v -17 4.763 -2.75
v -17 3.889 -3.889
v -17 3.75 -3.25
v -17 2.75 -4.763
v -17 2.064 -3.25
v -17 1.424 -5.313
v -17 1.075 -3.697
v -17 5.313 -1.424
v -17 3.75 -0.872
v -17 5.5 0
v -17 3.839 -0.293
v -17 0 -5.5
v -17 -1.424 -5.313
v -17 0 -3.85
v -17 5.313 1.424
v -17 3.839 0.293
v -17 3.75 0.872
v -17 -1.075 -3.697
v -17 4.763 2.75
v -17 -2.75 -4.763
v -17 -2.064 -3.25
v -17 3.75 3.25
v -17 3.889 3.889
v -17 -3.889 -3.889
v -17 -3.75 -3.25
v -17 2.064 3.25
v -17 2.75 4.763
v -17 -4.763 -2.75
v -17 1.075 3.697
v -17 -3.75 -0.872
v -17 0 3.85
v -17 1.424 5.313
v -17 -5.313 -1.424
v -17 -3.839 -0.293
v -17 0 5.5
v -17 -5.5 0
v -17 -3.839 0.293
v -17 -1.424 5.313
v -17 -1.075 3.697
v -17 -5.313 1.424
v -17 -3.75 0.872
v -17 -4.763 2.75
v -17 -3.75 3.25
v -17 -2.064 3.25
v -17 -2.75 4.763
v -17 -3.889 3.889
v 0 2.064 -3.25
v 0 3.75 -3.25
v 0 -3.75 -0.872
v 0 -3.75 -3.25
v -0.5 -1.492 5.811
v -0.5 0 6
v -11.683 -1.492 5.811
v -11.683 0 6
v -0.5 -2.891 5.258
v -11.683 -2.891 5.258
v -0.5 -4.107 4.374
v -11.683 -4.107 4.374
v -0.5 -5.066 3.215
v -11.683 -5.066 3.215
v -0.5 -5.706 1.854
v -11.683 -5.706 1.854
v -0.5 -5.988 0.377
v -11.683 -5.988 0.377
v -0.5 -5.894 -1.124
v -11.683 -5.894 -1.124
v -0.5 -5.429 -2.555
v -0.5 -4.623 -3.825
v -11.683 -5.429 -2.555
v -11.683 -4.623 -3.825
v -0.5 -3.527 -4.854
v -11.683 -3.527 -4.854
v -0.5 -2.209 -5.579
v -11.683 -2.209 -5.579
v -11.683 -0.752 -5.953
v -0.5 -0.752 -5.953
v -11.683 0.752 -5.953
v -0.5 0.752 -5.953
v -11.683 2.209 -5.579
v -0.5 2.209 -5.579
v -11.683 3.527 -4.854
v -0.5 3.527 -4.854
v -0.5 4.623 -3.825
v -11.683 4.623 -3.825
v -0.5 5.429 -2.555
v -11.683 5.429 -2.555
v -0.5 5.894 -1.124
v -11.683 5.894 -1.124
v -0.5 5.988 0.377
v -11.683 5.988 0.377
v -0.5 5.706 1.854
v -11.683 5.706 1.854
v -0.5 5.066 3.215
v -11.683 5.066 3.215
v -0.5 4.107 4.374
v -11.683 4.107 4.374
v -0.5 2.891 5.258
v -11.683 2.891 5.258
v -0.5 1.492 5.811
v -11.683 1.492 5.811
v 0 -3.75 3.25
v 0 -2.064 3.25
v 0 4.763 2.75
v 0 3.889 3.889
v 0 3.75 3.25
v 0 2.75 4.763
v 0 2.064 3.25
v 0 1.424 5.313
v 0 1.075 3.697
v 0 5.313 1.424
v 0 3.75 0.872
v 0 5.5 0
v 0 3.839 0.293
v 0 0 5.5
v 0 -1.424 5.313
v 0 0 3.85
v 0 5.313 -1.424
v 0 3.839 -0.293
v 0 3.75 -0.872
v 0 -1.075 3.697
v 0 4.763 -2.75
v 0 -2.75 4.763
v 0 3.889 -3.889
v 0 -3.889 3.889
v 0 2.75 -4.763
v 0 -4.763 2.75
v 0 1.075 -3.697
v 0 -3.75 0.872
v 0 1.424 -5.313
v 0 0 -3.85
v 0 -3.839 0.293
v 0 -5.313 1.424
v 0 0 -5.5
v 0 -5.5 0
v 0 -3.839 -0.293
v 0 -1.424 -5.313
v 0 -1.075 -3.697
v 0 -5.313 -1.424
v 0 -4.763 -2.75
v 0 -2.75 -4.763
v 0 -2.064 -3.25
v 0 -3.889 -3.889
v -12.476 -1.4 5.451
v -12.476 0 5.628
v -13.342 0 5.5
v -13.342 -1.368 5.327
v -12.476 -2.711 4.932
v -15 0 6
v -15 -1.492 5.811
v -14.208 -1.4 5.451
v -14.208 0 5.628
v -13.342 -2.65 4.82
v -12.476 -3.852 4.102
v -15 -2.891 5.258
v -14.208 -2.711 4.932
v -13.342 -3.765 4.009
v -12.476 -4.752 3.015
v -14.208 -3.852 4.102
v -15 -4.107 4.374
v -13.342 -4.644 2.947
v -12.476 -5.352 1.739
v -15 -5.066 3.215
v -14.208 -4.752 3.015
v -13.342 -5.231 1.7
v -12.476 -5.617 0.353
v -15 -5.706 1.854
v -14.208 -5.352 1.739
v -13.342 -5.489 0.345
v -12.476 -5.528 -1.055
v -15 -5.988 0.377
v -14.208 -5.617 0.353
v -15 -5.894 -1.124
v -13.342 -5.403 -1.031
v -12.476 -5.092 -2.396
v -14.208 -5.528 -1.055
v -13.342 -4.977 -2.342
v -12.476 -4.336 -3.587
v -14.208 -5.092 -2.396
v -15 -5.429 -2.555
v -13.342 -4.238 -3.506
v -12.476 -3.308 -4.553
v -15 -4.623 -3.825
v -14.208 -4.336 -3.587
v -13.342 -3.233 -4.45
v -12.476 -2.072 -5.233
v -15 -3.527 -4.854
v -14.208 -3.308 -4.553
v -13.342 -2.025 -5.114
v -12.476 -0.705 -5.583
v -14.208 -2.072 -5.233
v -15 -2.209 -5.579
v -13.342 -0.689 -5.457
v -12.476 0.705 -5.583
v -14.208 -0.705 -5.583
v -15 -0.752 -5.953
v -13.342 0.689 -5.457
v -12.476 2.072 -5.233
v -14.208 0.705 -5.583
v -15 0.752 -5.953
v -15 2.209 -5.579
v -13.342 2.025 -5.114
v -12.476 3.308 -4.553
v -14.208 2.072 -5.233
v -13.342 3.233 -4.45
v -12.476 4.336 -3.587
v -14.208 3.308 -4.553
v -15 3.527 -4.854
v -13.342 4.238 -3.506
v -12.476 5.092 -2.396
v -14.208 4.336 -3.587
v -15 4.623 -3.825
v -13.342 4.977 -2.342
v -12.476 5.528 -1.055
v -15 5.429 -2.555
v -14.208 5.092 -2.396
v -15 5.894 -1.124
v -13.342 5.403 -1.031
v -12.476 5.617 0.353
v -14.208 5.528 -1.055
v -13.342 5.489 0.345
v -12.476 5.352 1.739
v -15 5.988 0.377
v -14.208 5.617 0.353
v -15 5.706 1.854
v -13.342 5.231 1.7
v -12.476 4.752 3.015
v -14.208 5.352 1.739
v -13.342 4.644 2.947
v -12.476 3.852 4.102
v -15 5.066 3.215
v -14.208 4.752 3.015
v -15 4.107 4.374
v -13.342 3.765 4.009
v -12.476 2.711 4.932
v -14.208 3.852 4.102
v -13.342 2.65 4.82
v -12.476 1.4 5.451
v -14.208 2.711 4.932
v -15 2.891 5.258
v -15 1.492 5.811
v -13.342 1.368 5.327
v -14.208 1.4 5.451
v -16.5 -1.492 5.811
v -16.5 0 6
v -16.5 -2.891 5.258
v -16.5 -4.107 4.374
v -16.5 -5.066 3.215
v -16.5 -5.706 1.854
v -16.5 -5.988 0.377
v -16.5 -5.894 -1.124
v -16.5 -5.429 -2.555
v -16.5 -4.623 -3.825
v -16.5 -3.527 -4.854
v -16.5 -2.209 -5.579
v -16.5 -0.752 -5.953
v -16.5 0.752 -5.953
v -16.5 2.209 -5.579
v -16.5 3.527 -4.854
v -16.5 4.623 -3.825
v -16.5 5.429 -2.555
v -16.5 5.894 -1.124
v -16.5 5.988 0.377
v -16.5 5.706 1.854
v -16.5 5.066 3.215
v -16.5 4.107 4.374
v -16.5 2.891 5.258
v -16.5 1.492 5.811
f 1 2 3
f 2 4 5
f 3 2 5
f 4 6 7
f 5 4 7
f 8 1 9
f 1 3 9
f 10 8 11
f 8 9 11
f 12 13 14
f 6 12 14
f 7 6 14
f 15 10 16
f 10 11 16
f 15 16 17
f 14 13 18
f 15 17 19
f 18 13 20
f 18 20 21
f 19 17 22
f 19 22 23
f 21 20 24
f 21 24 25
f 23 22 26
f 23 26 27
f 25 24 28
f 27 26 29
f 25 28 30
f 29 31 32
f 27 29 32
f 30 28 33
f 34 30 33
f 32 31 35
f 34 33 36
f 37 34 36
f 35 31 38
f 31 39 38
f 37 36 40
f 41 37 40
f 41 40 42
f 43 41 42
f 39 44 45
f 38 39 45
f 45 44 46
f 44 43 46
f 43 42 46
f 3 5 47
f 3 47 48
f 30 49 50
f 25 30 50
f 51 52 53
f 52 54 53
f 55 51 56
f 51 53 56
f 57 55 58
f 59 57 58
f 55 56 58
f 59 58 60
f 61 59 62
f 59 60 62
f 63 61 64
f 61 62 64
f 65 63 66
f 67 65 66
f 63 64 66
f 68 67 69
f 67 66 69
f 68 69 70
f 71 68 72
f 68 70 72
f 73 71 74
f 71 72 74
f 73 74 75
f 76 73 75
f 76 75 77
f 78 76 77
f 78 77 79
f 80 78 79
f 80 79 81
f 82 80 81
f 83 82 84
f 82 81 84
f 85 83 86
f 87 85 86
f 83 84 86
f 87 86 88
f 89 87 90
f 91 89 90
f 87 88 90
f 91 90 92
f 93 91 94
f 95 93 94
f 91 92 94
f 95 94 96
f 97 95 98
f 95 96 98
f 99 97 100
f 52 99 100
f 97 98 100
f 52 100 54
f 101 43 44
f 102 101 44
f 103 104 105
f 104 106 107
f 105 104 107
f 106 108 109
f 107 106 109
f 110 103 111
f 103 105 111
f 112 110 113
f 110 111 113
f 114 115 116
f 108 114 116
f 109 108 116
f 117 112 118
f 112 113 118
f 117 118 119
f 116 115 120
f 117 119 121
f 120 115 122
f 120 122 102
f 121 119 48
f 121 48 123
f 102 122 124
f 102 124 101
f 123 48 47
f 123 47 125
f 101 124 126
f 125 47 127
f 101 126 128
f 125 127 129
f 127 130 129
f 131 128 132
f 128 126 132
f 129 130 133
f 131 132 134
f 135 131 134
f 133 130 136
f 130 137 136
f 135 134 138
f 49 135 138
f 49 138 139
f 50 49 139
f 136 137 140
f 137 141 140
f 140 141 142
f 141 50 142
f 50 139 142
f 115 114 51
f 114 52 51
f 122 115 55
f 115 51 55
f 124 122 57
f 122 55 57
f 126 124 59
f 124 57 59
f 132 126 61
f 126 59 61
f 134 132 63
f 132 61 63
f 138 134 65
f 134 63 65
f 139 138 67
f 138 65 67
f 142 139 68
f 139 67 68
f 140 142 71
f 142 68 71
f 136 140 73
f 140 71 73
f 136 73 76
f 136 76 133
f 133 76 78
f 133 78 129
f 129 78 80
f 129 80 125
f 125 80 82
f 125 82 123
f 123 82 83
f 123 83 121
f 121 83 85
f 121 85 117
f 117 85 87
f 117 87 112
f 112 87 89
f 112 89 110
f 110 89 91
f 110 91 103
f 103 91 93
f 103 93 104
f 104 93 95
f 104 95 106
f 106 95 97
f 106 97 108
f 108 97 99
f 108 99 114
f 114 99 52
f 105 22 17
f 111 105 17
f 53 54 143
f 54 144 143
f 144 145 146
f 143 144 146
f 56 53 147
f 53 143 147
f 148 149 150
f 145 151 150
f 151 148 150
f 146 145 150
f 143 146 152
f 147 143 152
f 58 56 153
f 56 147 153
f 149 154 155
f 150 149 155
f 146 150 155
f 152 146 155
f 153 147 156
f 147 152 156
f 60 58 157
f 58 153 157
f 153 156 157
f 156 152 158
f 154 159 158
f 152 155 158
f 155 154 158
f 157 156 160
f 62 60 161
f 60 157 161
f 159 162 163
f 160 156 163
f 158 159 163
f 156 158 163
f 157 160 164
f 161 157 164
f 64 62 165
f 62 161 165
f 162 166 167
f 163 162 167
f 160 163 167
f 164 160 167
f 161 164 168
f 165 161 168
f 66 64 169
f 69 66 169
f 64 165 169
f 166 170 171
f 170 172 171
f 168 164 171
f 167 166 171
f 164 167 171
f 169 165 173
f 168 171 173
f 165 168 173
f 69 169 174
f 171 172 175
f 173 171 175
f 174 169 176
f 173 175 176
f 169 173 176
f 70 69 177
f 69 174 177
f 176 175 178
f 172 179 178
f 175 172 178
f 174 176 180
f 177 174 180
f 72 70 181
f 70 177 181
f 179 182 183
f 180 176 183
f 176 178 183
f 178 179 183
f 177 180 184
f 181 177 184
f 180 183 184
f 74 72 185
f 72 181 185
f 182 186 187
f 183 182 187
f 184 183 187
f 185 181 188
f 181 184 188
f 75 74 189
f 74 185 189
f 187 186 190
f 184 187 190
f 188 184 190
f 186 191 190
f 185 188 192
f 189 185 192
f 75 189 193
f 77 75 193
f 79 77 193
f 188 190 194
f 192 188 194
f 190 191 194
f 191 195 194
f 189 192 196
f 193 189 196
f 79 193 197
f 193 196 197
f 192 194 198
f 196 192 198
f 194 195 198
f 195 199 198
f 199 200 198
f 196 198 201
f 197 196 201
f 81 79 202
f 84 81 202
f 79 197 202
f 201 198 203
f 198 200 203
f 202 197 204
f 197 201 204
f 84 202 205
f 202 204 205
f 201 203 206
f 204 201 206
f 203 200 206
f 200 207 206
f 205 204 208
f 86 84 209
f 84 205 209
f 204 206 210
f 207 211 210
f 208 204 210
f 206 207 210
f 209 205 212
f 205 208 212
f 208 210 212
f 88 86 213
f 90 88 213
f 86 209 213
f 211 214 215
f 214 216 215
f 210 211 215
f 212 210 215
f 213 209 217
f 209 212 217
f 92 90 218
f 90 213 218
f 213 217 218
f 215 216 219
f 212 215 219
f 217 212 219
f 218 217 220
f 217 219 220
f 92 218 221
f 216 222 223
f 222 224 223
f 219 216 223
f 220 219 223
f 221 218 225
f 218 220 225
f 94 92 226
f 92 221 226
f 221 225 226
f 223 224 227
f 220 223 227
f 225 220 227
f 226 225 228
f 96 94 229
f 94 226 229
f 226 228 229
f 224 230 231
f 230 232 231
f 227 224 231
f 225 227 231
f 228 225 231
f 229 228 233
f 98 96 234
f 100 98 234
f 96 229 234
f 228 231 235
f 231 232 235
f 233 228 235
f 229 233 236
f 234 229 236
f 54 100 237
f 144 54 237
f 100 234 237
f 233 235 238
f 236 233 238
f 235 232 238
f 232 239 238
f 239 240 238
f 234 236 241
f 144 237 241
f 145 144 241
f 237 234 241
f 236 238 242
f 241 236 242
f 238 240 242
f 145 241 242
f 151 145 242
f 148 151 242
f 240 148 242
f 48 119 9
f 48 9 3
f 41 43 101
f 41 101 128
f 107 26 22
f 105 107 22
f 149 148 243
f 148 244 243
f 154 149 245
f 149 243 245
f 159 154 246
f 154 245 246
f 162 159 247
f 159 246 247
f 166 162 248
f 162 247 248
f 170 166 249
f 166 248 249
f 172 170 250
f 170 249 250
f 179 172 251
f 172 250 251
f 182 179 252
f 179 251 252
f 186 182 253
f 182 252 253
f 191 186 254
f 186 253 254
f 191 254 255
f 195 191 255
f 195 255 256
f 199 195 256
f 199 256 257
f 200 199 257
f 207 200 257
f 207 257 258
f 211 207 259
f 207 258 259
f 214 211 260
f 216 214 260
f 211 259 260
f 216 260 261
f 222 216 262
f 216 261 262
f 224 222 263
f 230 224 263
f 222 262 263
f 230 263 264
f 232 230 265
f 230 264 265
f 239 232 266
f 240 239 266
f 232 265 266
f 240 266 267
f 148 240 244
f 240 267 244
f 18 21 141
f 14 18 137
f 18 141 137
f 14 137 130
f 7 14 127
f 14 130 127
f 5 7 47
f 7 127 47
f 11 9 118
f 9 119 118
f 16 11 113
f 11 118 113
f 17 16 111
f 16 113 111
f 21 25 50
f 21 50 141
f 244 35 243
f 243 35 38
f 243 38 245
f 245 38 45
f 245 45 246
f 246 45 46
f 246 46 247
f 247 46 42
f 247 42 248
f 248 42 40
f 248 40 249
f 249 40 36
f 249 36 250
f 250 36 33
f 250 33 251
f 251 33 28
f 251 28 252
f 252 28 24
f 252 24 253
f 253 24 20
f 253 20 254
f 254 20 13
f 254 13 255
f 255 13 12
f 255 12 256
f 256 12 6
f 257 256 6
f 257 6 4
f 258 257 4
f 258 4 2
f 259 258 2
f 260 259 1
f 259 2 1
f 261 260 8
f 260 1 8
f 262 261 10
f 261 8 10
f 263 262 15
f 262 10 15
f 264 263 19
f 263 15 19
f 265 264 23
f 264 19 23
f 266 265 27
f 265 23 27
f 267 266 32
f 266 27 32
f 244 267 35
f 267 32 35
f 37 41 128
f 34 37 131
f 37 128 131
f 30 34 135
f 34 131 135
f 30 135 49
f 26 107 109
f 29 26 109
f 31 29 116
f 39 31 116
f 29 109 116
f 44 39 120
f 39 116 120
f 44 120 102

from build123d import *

# Parameters (mm, degrees)
ESQUISSE2_W             = 6.5
ESQUISSE2_H             = 7.5
ENL_V_MAT_EXTRU_1_DEPTH = 20


with BuildPart() as part:
    # Esquisse1 → Révolution1 (revolve)
    with BuildSketch(Plane.XY):
        with BuildLine():
            Line((-17, 5.5), (-17, 3.85))
            Line((-17, 3.85), (0, 3.85))
            Line((0, 3.85), (0, 5.5))
            Line((0, 5.5), (-0.5, 6))
            Line((-0.5, 6), (-11.68337521, 6))
            ThreePointArc((-11.68337521, 6), (-13.341687605, 5.5), (-15, 6))
            Line((-15, 6), (-16.5, 6))
            Line((-16.5, 6), (-17, 5.5))
        make_face()
    revolve(axis=Axis((-34.750549451, 0, 0), (1, 0, 0)))

    # Esquisse2 → Enlèv. mat.-Extru.1 (cut, through all)
    with BuildSketch(Plane(origin=(0, 0, 0), x_dir=(0, 0, -1), z_dir=(1, 0, 0))):
        Rectangle(ESQUISSE2_W, ESQUISSE2_H)
    extrude(amount=-ENL_V_MAT_EXTRU_1_DEPTH, mode=Mode.SUBTRACT)


solid = part.part
